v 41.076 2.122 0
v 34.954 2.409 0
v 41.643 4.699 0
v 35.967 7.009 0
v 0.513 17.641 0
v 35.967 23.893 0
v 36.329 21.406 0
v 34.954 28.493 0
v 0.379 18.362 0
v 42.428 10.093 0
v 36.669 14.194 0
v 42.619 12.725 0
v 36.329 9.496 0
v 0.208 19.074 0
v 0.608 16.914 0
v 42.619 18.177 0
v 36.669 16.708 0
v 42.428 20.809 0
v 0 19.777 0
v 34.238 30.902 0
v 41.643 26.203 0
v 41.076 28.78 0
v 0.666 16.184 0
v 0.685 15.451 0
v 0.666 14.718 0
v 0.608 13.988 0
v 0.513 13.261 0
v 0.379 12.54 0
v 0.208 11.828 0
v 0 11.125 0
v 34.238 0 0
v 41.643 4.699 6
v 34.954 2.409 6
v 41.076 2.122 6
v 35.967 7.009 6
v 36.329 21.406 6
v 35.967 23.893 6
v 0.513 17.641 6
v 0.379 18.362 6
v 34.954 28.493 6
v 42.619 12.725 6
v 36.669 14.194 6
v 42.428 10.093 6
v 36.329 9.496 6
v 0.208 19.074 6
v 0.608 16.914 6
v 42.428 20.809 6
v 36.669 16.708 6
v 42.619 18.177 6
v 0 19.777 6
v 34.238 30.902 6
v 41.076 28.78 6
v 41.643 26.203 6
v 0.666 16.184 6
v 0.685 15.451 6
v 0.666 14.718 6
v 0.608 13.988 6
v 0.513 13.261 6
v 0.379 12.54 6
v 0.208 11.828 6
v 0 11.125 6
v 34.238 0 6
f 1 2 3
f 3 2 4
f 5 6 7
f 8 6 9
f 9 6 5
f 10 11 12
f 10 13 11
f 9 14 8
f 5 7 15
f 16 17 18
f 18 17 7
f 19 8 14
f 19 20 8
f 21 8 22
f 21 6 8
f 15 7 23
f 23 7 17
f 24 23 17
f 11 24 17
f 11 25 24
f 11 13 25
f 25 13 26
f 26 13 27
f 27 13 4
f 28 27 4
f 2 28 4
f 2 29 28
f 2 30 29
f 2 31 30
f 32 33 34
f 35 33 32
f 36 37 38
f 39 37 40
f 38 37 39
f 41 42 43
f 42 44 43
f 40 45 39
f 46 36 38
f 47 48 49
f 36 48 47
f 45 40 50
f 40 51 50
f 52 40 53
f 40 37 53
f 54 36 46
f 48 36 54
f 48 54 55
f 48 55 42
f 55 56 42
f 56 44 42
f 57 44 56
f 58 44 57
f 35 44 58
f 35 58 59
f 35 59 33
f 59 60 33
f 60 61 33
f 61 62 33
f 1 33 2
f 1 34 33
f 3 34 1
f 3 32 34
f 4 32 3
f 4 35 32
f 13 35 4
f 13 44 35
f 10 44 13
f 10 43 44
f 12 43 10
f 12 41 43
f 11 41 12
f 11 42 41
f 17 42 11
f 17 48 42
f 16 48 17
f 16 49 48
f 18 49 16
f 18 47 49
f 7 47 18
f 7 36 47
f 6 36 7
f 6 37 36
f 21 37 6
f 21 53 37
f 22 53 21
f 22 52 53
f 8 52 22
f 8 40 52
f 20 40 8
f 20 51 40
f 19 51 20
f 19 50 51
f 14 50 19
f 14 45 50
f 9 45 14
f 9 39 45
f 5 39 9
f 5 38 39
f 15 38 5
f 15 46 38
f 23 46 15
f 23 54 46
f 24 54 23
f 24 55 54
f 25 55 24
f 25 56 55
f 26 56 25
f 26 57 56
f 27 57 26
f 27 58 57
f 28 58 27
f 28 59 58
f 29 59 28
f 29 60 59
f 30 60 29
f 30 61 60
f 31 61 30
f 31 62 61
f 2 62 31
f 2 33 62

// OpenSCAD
$fn = 32;

// ----------------------------------------------------------------------
// Gear sector: 4 teeth on 36 degrees
// ----------------------------------------------------------------------

// --- parameters (mm) ---
sector_angle = 36;        // sector angle, degrees
root_r = 50;              // root circle radius
tooth_h = 6;              // tooth height over the root circle
teeth = 4;                // number of teeth on the sector
hub_r = 14;               // hub bore radius
plate_t = 6;              // sector thickness, Z
arc_step = 3;             // sampling step of the root/hub arcs, degrees
fit_tol = 0.05;           // declared fit tolerance (prompt contract)
free_tol = 0.3;           // declared free tolerance (prompt contract)

tip_r = root_r + tooth_h;  // tip circle radius

profile = [[34.238, 0], [34.954, 2.409], [41.076, 2.122], [41.643, 4.699], [35.967, 7.009], [36.329, 9.496], [42.428, 10.093], [42.619, 12.725], [36.669, 14.194], [36.669, 16.708], [42.619, 18.177], [42.428, 20.809], [36.329, 21.406], [35.967, 23.893], [41.643, 26.203], [41.076, 28.78], [34.954, 28.493], [34.238, 30.902], [0, 19.777], [0.208, 19.074], [0.379, 18.362], [0.513, 17.641], [0.608, 16.914], [0.666, 16.184], [0.685, 15.451], [0.666, 14.718], [0.608, 13.988], [0.513, 13.261], [0.379, 12.54], [0.208, 11.828], [0, 11.125]];  // primary outline, 31 points, counter clockwise

// --- the one profile operation ---
linear_extrude(height = plate_t) polygon(points = profile);
